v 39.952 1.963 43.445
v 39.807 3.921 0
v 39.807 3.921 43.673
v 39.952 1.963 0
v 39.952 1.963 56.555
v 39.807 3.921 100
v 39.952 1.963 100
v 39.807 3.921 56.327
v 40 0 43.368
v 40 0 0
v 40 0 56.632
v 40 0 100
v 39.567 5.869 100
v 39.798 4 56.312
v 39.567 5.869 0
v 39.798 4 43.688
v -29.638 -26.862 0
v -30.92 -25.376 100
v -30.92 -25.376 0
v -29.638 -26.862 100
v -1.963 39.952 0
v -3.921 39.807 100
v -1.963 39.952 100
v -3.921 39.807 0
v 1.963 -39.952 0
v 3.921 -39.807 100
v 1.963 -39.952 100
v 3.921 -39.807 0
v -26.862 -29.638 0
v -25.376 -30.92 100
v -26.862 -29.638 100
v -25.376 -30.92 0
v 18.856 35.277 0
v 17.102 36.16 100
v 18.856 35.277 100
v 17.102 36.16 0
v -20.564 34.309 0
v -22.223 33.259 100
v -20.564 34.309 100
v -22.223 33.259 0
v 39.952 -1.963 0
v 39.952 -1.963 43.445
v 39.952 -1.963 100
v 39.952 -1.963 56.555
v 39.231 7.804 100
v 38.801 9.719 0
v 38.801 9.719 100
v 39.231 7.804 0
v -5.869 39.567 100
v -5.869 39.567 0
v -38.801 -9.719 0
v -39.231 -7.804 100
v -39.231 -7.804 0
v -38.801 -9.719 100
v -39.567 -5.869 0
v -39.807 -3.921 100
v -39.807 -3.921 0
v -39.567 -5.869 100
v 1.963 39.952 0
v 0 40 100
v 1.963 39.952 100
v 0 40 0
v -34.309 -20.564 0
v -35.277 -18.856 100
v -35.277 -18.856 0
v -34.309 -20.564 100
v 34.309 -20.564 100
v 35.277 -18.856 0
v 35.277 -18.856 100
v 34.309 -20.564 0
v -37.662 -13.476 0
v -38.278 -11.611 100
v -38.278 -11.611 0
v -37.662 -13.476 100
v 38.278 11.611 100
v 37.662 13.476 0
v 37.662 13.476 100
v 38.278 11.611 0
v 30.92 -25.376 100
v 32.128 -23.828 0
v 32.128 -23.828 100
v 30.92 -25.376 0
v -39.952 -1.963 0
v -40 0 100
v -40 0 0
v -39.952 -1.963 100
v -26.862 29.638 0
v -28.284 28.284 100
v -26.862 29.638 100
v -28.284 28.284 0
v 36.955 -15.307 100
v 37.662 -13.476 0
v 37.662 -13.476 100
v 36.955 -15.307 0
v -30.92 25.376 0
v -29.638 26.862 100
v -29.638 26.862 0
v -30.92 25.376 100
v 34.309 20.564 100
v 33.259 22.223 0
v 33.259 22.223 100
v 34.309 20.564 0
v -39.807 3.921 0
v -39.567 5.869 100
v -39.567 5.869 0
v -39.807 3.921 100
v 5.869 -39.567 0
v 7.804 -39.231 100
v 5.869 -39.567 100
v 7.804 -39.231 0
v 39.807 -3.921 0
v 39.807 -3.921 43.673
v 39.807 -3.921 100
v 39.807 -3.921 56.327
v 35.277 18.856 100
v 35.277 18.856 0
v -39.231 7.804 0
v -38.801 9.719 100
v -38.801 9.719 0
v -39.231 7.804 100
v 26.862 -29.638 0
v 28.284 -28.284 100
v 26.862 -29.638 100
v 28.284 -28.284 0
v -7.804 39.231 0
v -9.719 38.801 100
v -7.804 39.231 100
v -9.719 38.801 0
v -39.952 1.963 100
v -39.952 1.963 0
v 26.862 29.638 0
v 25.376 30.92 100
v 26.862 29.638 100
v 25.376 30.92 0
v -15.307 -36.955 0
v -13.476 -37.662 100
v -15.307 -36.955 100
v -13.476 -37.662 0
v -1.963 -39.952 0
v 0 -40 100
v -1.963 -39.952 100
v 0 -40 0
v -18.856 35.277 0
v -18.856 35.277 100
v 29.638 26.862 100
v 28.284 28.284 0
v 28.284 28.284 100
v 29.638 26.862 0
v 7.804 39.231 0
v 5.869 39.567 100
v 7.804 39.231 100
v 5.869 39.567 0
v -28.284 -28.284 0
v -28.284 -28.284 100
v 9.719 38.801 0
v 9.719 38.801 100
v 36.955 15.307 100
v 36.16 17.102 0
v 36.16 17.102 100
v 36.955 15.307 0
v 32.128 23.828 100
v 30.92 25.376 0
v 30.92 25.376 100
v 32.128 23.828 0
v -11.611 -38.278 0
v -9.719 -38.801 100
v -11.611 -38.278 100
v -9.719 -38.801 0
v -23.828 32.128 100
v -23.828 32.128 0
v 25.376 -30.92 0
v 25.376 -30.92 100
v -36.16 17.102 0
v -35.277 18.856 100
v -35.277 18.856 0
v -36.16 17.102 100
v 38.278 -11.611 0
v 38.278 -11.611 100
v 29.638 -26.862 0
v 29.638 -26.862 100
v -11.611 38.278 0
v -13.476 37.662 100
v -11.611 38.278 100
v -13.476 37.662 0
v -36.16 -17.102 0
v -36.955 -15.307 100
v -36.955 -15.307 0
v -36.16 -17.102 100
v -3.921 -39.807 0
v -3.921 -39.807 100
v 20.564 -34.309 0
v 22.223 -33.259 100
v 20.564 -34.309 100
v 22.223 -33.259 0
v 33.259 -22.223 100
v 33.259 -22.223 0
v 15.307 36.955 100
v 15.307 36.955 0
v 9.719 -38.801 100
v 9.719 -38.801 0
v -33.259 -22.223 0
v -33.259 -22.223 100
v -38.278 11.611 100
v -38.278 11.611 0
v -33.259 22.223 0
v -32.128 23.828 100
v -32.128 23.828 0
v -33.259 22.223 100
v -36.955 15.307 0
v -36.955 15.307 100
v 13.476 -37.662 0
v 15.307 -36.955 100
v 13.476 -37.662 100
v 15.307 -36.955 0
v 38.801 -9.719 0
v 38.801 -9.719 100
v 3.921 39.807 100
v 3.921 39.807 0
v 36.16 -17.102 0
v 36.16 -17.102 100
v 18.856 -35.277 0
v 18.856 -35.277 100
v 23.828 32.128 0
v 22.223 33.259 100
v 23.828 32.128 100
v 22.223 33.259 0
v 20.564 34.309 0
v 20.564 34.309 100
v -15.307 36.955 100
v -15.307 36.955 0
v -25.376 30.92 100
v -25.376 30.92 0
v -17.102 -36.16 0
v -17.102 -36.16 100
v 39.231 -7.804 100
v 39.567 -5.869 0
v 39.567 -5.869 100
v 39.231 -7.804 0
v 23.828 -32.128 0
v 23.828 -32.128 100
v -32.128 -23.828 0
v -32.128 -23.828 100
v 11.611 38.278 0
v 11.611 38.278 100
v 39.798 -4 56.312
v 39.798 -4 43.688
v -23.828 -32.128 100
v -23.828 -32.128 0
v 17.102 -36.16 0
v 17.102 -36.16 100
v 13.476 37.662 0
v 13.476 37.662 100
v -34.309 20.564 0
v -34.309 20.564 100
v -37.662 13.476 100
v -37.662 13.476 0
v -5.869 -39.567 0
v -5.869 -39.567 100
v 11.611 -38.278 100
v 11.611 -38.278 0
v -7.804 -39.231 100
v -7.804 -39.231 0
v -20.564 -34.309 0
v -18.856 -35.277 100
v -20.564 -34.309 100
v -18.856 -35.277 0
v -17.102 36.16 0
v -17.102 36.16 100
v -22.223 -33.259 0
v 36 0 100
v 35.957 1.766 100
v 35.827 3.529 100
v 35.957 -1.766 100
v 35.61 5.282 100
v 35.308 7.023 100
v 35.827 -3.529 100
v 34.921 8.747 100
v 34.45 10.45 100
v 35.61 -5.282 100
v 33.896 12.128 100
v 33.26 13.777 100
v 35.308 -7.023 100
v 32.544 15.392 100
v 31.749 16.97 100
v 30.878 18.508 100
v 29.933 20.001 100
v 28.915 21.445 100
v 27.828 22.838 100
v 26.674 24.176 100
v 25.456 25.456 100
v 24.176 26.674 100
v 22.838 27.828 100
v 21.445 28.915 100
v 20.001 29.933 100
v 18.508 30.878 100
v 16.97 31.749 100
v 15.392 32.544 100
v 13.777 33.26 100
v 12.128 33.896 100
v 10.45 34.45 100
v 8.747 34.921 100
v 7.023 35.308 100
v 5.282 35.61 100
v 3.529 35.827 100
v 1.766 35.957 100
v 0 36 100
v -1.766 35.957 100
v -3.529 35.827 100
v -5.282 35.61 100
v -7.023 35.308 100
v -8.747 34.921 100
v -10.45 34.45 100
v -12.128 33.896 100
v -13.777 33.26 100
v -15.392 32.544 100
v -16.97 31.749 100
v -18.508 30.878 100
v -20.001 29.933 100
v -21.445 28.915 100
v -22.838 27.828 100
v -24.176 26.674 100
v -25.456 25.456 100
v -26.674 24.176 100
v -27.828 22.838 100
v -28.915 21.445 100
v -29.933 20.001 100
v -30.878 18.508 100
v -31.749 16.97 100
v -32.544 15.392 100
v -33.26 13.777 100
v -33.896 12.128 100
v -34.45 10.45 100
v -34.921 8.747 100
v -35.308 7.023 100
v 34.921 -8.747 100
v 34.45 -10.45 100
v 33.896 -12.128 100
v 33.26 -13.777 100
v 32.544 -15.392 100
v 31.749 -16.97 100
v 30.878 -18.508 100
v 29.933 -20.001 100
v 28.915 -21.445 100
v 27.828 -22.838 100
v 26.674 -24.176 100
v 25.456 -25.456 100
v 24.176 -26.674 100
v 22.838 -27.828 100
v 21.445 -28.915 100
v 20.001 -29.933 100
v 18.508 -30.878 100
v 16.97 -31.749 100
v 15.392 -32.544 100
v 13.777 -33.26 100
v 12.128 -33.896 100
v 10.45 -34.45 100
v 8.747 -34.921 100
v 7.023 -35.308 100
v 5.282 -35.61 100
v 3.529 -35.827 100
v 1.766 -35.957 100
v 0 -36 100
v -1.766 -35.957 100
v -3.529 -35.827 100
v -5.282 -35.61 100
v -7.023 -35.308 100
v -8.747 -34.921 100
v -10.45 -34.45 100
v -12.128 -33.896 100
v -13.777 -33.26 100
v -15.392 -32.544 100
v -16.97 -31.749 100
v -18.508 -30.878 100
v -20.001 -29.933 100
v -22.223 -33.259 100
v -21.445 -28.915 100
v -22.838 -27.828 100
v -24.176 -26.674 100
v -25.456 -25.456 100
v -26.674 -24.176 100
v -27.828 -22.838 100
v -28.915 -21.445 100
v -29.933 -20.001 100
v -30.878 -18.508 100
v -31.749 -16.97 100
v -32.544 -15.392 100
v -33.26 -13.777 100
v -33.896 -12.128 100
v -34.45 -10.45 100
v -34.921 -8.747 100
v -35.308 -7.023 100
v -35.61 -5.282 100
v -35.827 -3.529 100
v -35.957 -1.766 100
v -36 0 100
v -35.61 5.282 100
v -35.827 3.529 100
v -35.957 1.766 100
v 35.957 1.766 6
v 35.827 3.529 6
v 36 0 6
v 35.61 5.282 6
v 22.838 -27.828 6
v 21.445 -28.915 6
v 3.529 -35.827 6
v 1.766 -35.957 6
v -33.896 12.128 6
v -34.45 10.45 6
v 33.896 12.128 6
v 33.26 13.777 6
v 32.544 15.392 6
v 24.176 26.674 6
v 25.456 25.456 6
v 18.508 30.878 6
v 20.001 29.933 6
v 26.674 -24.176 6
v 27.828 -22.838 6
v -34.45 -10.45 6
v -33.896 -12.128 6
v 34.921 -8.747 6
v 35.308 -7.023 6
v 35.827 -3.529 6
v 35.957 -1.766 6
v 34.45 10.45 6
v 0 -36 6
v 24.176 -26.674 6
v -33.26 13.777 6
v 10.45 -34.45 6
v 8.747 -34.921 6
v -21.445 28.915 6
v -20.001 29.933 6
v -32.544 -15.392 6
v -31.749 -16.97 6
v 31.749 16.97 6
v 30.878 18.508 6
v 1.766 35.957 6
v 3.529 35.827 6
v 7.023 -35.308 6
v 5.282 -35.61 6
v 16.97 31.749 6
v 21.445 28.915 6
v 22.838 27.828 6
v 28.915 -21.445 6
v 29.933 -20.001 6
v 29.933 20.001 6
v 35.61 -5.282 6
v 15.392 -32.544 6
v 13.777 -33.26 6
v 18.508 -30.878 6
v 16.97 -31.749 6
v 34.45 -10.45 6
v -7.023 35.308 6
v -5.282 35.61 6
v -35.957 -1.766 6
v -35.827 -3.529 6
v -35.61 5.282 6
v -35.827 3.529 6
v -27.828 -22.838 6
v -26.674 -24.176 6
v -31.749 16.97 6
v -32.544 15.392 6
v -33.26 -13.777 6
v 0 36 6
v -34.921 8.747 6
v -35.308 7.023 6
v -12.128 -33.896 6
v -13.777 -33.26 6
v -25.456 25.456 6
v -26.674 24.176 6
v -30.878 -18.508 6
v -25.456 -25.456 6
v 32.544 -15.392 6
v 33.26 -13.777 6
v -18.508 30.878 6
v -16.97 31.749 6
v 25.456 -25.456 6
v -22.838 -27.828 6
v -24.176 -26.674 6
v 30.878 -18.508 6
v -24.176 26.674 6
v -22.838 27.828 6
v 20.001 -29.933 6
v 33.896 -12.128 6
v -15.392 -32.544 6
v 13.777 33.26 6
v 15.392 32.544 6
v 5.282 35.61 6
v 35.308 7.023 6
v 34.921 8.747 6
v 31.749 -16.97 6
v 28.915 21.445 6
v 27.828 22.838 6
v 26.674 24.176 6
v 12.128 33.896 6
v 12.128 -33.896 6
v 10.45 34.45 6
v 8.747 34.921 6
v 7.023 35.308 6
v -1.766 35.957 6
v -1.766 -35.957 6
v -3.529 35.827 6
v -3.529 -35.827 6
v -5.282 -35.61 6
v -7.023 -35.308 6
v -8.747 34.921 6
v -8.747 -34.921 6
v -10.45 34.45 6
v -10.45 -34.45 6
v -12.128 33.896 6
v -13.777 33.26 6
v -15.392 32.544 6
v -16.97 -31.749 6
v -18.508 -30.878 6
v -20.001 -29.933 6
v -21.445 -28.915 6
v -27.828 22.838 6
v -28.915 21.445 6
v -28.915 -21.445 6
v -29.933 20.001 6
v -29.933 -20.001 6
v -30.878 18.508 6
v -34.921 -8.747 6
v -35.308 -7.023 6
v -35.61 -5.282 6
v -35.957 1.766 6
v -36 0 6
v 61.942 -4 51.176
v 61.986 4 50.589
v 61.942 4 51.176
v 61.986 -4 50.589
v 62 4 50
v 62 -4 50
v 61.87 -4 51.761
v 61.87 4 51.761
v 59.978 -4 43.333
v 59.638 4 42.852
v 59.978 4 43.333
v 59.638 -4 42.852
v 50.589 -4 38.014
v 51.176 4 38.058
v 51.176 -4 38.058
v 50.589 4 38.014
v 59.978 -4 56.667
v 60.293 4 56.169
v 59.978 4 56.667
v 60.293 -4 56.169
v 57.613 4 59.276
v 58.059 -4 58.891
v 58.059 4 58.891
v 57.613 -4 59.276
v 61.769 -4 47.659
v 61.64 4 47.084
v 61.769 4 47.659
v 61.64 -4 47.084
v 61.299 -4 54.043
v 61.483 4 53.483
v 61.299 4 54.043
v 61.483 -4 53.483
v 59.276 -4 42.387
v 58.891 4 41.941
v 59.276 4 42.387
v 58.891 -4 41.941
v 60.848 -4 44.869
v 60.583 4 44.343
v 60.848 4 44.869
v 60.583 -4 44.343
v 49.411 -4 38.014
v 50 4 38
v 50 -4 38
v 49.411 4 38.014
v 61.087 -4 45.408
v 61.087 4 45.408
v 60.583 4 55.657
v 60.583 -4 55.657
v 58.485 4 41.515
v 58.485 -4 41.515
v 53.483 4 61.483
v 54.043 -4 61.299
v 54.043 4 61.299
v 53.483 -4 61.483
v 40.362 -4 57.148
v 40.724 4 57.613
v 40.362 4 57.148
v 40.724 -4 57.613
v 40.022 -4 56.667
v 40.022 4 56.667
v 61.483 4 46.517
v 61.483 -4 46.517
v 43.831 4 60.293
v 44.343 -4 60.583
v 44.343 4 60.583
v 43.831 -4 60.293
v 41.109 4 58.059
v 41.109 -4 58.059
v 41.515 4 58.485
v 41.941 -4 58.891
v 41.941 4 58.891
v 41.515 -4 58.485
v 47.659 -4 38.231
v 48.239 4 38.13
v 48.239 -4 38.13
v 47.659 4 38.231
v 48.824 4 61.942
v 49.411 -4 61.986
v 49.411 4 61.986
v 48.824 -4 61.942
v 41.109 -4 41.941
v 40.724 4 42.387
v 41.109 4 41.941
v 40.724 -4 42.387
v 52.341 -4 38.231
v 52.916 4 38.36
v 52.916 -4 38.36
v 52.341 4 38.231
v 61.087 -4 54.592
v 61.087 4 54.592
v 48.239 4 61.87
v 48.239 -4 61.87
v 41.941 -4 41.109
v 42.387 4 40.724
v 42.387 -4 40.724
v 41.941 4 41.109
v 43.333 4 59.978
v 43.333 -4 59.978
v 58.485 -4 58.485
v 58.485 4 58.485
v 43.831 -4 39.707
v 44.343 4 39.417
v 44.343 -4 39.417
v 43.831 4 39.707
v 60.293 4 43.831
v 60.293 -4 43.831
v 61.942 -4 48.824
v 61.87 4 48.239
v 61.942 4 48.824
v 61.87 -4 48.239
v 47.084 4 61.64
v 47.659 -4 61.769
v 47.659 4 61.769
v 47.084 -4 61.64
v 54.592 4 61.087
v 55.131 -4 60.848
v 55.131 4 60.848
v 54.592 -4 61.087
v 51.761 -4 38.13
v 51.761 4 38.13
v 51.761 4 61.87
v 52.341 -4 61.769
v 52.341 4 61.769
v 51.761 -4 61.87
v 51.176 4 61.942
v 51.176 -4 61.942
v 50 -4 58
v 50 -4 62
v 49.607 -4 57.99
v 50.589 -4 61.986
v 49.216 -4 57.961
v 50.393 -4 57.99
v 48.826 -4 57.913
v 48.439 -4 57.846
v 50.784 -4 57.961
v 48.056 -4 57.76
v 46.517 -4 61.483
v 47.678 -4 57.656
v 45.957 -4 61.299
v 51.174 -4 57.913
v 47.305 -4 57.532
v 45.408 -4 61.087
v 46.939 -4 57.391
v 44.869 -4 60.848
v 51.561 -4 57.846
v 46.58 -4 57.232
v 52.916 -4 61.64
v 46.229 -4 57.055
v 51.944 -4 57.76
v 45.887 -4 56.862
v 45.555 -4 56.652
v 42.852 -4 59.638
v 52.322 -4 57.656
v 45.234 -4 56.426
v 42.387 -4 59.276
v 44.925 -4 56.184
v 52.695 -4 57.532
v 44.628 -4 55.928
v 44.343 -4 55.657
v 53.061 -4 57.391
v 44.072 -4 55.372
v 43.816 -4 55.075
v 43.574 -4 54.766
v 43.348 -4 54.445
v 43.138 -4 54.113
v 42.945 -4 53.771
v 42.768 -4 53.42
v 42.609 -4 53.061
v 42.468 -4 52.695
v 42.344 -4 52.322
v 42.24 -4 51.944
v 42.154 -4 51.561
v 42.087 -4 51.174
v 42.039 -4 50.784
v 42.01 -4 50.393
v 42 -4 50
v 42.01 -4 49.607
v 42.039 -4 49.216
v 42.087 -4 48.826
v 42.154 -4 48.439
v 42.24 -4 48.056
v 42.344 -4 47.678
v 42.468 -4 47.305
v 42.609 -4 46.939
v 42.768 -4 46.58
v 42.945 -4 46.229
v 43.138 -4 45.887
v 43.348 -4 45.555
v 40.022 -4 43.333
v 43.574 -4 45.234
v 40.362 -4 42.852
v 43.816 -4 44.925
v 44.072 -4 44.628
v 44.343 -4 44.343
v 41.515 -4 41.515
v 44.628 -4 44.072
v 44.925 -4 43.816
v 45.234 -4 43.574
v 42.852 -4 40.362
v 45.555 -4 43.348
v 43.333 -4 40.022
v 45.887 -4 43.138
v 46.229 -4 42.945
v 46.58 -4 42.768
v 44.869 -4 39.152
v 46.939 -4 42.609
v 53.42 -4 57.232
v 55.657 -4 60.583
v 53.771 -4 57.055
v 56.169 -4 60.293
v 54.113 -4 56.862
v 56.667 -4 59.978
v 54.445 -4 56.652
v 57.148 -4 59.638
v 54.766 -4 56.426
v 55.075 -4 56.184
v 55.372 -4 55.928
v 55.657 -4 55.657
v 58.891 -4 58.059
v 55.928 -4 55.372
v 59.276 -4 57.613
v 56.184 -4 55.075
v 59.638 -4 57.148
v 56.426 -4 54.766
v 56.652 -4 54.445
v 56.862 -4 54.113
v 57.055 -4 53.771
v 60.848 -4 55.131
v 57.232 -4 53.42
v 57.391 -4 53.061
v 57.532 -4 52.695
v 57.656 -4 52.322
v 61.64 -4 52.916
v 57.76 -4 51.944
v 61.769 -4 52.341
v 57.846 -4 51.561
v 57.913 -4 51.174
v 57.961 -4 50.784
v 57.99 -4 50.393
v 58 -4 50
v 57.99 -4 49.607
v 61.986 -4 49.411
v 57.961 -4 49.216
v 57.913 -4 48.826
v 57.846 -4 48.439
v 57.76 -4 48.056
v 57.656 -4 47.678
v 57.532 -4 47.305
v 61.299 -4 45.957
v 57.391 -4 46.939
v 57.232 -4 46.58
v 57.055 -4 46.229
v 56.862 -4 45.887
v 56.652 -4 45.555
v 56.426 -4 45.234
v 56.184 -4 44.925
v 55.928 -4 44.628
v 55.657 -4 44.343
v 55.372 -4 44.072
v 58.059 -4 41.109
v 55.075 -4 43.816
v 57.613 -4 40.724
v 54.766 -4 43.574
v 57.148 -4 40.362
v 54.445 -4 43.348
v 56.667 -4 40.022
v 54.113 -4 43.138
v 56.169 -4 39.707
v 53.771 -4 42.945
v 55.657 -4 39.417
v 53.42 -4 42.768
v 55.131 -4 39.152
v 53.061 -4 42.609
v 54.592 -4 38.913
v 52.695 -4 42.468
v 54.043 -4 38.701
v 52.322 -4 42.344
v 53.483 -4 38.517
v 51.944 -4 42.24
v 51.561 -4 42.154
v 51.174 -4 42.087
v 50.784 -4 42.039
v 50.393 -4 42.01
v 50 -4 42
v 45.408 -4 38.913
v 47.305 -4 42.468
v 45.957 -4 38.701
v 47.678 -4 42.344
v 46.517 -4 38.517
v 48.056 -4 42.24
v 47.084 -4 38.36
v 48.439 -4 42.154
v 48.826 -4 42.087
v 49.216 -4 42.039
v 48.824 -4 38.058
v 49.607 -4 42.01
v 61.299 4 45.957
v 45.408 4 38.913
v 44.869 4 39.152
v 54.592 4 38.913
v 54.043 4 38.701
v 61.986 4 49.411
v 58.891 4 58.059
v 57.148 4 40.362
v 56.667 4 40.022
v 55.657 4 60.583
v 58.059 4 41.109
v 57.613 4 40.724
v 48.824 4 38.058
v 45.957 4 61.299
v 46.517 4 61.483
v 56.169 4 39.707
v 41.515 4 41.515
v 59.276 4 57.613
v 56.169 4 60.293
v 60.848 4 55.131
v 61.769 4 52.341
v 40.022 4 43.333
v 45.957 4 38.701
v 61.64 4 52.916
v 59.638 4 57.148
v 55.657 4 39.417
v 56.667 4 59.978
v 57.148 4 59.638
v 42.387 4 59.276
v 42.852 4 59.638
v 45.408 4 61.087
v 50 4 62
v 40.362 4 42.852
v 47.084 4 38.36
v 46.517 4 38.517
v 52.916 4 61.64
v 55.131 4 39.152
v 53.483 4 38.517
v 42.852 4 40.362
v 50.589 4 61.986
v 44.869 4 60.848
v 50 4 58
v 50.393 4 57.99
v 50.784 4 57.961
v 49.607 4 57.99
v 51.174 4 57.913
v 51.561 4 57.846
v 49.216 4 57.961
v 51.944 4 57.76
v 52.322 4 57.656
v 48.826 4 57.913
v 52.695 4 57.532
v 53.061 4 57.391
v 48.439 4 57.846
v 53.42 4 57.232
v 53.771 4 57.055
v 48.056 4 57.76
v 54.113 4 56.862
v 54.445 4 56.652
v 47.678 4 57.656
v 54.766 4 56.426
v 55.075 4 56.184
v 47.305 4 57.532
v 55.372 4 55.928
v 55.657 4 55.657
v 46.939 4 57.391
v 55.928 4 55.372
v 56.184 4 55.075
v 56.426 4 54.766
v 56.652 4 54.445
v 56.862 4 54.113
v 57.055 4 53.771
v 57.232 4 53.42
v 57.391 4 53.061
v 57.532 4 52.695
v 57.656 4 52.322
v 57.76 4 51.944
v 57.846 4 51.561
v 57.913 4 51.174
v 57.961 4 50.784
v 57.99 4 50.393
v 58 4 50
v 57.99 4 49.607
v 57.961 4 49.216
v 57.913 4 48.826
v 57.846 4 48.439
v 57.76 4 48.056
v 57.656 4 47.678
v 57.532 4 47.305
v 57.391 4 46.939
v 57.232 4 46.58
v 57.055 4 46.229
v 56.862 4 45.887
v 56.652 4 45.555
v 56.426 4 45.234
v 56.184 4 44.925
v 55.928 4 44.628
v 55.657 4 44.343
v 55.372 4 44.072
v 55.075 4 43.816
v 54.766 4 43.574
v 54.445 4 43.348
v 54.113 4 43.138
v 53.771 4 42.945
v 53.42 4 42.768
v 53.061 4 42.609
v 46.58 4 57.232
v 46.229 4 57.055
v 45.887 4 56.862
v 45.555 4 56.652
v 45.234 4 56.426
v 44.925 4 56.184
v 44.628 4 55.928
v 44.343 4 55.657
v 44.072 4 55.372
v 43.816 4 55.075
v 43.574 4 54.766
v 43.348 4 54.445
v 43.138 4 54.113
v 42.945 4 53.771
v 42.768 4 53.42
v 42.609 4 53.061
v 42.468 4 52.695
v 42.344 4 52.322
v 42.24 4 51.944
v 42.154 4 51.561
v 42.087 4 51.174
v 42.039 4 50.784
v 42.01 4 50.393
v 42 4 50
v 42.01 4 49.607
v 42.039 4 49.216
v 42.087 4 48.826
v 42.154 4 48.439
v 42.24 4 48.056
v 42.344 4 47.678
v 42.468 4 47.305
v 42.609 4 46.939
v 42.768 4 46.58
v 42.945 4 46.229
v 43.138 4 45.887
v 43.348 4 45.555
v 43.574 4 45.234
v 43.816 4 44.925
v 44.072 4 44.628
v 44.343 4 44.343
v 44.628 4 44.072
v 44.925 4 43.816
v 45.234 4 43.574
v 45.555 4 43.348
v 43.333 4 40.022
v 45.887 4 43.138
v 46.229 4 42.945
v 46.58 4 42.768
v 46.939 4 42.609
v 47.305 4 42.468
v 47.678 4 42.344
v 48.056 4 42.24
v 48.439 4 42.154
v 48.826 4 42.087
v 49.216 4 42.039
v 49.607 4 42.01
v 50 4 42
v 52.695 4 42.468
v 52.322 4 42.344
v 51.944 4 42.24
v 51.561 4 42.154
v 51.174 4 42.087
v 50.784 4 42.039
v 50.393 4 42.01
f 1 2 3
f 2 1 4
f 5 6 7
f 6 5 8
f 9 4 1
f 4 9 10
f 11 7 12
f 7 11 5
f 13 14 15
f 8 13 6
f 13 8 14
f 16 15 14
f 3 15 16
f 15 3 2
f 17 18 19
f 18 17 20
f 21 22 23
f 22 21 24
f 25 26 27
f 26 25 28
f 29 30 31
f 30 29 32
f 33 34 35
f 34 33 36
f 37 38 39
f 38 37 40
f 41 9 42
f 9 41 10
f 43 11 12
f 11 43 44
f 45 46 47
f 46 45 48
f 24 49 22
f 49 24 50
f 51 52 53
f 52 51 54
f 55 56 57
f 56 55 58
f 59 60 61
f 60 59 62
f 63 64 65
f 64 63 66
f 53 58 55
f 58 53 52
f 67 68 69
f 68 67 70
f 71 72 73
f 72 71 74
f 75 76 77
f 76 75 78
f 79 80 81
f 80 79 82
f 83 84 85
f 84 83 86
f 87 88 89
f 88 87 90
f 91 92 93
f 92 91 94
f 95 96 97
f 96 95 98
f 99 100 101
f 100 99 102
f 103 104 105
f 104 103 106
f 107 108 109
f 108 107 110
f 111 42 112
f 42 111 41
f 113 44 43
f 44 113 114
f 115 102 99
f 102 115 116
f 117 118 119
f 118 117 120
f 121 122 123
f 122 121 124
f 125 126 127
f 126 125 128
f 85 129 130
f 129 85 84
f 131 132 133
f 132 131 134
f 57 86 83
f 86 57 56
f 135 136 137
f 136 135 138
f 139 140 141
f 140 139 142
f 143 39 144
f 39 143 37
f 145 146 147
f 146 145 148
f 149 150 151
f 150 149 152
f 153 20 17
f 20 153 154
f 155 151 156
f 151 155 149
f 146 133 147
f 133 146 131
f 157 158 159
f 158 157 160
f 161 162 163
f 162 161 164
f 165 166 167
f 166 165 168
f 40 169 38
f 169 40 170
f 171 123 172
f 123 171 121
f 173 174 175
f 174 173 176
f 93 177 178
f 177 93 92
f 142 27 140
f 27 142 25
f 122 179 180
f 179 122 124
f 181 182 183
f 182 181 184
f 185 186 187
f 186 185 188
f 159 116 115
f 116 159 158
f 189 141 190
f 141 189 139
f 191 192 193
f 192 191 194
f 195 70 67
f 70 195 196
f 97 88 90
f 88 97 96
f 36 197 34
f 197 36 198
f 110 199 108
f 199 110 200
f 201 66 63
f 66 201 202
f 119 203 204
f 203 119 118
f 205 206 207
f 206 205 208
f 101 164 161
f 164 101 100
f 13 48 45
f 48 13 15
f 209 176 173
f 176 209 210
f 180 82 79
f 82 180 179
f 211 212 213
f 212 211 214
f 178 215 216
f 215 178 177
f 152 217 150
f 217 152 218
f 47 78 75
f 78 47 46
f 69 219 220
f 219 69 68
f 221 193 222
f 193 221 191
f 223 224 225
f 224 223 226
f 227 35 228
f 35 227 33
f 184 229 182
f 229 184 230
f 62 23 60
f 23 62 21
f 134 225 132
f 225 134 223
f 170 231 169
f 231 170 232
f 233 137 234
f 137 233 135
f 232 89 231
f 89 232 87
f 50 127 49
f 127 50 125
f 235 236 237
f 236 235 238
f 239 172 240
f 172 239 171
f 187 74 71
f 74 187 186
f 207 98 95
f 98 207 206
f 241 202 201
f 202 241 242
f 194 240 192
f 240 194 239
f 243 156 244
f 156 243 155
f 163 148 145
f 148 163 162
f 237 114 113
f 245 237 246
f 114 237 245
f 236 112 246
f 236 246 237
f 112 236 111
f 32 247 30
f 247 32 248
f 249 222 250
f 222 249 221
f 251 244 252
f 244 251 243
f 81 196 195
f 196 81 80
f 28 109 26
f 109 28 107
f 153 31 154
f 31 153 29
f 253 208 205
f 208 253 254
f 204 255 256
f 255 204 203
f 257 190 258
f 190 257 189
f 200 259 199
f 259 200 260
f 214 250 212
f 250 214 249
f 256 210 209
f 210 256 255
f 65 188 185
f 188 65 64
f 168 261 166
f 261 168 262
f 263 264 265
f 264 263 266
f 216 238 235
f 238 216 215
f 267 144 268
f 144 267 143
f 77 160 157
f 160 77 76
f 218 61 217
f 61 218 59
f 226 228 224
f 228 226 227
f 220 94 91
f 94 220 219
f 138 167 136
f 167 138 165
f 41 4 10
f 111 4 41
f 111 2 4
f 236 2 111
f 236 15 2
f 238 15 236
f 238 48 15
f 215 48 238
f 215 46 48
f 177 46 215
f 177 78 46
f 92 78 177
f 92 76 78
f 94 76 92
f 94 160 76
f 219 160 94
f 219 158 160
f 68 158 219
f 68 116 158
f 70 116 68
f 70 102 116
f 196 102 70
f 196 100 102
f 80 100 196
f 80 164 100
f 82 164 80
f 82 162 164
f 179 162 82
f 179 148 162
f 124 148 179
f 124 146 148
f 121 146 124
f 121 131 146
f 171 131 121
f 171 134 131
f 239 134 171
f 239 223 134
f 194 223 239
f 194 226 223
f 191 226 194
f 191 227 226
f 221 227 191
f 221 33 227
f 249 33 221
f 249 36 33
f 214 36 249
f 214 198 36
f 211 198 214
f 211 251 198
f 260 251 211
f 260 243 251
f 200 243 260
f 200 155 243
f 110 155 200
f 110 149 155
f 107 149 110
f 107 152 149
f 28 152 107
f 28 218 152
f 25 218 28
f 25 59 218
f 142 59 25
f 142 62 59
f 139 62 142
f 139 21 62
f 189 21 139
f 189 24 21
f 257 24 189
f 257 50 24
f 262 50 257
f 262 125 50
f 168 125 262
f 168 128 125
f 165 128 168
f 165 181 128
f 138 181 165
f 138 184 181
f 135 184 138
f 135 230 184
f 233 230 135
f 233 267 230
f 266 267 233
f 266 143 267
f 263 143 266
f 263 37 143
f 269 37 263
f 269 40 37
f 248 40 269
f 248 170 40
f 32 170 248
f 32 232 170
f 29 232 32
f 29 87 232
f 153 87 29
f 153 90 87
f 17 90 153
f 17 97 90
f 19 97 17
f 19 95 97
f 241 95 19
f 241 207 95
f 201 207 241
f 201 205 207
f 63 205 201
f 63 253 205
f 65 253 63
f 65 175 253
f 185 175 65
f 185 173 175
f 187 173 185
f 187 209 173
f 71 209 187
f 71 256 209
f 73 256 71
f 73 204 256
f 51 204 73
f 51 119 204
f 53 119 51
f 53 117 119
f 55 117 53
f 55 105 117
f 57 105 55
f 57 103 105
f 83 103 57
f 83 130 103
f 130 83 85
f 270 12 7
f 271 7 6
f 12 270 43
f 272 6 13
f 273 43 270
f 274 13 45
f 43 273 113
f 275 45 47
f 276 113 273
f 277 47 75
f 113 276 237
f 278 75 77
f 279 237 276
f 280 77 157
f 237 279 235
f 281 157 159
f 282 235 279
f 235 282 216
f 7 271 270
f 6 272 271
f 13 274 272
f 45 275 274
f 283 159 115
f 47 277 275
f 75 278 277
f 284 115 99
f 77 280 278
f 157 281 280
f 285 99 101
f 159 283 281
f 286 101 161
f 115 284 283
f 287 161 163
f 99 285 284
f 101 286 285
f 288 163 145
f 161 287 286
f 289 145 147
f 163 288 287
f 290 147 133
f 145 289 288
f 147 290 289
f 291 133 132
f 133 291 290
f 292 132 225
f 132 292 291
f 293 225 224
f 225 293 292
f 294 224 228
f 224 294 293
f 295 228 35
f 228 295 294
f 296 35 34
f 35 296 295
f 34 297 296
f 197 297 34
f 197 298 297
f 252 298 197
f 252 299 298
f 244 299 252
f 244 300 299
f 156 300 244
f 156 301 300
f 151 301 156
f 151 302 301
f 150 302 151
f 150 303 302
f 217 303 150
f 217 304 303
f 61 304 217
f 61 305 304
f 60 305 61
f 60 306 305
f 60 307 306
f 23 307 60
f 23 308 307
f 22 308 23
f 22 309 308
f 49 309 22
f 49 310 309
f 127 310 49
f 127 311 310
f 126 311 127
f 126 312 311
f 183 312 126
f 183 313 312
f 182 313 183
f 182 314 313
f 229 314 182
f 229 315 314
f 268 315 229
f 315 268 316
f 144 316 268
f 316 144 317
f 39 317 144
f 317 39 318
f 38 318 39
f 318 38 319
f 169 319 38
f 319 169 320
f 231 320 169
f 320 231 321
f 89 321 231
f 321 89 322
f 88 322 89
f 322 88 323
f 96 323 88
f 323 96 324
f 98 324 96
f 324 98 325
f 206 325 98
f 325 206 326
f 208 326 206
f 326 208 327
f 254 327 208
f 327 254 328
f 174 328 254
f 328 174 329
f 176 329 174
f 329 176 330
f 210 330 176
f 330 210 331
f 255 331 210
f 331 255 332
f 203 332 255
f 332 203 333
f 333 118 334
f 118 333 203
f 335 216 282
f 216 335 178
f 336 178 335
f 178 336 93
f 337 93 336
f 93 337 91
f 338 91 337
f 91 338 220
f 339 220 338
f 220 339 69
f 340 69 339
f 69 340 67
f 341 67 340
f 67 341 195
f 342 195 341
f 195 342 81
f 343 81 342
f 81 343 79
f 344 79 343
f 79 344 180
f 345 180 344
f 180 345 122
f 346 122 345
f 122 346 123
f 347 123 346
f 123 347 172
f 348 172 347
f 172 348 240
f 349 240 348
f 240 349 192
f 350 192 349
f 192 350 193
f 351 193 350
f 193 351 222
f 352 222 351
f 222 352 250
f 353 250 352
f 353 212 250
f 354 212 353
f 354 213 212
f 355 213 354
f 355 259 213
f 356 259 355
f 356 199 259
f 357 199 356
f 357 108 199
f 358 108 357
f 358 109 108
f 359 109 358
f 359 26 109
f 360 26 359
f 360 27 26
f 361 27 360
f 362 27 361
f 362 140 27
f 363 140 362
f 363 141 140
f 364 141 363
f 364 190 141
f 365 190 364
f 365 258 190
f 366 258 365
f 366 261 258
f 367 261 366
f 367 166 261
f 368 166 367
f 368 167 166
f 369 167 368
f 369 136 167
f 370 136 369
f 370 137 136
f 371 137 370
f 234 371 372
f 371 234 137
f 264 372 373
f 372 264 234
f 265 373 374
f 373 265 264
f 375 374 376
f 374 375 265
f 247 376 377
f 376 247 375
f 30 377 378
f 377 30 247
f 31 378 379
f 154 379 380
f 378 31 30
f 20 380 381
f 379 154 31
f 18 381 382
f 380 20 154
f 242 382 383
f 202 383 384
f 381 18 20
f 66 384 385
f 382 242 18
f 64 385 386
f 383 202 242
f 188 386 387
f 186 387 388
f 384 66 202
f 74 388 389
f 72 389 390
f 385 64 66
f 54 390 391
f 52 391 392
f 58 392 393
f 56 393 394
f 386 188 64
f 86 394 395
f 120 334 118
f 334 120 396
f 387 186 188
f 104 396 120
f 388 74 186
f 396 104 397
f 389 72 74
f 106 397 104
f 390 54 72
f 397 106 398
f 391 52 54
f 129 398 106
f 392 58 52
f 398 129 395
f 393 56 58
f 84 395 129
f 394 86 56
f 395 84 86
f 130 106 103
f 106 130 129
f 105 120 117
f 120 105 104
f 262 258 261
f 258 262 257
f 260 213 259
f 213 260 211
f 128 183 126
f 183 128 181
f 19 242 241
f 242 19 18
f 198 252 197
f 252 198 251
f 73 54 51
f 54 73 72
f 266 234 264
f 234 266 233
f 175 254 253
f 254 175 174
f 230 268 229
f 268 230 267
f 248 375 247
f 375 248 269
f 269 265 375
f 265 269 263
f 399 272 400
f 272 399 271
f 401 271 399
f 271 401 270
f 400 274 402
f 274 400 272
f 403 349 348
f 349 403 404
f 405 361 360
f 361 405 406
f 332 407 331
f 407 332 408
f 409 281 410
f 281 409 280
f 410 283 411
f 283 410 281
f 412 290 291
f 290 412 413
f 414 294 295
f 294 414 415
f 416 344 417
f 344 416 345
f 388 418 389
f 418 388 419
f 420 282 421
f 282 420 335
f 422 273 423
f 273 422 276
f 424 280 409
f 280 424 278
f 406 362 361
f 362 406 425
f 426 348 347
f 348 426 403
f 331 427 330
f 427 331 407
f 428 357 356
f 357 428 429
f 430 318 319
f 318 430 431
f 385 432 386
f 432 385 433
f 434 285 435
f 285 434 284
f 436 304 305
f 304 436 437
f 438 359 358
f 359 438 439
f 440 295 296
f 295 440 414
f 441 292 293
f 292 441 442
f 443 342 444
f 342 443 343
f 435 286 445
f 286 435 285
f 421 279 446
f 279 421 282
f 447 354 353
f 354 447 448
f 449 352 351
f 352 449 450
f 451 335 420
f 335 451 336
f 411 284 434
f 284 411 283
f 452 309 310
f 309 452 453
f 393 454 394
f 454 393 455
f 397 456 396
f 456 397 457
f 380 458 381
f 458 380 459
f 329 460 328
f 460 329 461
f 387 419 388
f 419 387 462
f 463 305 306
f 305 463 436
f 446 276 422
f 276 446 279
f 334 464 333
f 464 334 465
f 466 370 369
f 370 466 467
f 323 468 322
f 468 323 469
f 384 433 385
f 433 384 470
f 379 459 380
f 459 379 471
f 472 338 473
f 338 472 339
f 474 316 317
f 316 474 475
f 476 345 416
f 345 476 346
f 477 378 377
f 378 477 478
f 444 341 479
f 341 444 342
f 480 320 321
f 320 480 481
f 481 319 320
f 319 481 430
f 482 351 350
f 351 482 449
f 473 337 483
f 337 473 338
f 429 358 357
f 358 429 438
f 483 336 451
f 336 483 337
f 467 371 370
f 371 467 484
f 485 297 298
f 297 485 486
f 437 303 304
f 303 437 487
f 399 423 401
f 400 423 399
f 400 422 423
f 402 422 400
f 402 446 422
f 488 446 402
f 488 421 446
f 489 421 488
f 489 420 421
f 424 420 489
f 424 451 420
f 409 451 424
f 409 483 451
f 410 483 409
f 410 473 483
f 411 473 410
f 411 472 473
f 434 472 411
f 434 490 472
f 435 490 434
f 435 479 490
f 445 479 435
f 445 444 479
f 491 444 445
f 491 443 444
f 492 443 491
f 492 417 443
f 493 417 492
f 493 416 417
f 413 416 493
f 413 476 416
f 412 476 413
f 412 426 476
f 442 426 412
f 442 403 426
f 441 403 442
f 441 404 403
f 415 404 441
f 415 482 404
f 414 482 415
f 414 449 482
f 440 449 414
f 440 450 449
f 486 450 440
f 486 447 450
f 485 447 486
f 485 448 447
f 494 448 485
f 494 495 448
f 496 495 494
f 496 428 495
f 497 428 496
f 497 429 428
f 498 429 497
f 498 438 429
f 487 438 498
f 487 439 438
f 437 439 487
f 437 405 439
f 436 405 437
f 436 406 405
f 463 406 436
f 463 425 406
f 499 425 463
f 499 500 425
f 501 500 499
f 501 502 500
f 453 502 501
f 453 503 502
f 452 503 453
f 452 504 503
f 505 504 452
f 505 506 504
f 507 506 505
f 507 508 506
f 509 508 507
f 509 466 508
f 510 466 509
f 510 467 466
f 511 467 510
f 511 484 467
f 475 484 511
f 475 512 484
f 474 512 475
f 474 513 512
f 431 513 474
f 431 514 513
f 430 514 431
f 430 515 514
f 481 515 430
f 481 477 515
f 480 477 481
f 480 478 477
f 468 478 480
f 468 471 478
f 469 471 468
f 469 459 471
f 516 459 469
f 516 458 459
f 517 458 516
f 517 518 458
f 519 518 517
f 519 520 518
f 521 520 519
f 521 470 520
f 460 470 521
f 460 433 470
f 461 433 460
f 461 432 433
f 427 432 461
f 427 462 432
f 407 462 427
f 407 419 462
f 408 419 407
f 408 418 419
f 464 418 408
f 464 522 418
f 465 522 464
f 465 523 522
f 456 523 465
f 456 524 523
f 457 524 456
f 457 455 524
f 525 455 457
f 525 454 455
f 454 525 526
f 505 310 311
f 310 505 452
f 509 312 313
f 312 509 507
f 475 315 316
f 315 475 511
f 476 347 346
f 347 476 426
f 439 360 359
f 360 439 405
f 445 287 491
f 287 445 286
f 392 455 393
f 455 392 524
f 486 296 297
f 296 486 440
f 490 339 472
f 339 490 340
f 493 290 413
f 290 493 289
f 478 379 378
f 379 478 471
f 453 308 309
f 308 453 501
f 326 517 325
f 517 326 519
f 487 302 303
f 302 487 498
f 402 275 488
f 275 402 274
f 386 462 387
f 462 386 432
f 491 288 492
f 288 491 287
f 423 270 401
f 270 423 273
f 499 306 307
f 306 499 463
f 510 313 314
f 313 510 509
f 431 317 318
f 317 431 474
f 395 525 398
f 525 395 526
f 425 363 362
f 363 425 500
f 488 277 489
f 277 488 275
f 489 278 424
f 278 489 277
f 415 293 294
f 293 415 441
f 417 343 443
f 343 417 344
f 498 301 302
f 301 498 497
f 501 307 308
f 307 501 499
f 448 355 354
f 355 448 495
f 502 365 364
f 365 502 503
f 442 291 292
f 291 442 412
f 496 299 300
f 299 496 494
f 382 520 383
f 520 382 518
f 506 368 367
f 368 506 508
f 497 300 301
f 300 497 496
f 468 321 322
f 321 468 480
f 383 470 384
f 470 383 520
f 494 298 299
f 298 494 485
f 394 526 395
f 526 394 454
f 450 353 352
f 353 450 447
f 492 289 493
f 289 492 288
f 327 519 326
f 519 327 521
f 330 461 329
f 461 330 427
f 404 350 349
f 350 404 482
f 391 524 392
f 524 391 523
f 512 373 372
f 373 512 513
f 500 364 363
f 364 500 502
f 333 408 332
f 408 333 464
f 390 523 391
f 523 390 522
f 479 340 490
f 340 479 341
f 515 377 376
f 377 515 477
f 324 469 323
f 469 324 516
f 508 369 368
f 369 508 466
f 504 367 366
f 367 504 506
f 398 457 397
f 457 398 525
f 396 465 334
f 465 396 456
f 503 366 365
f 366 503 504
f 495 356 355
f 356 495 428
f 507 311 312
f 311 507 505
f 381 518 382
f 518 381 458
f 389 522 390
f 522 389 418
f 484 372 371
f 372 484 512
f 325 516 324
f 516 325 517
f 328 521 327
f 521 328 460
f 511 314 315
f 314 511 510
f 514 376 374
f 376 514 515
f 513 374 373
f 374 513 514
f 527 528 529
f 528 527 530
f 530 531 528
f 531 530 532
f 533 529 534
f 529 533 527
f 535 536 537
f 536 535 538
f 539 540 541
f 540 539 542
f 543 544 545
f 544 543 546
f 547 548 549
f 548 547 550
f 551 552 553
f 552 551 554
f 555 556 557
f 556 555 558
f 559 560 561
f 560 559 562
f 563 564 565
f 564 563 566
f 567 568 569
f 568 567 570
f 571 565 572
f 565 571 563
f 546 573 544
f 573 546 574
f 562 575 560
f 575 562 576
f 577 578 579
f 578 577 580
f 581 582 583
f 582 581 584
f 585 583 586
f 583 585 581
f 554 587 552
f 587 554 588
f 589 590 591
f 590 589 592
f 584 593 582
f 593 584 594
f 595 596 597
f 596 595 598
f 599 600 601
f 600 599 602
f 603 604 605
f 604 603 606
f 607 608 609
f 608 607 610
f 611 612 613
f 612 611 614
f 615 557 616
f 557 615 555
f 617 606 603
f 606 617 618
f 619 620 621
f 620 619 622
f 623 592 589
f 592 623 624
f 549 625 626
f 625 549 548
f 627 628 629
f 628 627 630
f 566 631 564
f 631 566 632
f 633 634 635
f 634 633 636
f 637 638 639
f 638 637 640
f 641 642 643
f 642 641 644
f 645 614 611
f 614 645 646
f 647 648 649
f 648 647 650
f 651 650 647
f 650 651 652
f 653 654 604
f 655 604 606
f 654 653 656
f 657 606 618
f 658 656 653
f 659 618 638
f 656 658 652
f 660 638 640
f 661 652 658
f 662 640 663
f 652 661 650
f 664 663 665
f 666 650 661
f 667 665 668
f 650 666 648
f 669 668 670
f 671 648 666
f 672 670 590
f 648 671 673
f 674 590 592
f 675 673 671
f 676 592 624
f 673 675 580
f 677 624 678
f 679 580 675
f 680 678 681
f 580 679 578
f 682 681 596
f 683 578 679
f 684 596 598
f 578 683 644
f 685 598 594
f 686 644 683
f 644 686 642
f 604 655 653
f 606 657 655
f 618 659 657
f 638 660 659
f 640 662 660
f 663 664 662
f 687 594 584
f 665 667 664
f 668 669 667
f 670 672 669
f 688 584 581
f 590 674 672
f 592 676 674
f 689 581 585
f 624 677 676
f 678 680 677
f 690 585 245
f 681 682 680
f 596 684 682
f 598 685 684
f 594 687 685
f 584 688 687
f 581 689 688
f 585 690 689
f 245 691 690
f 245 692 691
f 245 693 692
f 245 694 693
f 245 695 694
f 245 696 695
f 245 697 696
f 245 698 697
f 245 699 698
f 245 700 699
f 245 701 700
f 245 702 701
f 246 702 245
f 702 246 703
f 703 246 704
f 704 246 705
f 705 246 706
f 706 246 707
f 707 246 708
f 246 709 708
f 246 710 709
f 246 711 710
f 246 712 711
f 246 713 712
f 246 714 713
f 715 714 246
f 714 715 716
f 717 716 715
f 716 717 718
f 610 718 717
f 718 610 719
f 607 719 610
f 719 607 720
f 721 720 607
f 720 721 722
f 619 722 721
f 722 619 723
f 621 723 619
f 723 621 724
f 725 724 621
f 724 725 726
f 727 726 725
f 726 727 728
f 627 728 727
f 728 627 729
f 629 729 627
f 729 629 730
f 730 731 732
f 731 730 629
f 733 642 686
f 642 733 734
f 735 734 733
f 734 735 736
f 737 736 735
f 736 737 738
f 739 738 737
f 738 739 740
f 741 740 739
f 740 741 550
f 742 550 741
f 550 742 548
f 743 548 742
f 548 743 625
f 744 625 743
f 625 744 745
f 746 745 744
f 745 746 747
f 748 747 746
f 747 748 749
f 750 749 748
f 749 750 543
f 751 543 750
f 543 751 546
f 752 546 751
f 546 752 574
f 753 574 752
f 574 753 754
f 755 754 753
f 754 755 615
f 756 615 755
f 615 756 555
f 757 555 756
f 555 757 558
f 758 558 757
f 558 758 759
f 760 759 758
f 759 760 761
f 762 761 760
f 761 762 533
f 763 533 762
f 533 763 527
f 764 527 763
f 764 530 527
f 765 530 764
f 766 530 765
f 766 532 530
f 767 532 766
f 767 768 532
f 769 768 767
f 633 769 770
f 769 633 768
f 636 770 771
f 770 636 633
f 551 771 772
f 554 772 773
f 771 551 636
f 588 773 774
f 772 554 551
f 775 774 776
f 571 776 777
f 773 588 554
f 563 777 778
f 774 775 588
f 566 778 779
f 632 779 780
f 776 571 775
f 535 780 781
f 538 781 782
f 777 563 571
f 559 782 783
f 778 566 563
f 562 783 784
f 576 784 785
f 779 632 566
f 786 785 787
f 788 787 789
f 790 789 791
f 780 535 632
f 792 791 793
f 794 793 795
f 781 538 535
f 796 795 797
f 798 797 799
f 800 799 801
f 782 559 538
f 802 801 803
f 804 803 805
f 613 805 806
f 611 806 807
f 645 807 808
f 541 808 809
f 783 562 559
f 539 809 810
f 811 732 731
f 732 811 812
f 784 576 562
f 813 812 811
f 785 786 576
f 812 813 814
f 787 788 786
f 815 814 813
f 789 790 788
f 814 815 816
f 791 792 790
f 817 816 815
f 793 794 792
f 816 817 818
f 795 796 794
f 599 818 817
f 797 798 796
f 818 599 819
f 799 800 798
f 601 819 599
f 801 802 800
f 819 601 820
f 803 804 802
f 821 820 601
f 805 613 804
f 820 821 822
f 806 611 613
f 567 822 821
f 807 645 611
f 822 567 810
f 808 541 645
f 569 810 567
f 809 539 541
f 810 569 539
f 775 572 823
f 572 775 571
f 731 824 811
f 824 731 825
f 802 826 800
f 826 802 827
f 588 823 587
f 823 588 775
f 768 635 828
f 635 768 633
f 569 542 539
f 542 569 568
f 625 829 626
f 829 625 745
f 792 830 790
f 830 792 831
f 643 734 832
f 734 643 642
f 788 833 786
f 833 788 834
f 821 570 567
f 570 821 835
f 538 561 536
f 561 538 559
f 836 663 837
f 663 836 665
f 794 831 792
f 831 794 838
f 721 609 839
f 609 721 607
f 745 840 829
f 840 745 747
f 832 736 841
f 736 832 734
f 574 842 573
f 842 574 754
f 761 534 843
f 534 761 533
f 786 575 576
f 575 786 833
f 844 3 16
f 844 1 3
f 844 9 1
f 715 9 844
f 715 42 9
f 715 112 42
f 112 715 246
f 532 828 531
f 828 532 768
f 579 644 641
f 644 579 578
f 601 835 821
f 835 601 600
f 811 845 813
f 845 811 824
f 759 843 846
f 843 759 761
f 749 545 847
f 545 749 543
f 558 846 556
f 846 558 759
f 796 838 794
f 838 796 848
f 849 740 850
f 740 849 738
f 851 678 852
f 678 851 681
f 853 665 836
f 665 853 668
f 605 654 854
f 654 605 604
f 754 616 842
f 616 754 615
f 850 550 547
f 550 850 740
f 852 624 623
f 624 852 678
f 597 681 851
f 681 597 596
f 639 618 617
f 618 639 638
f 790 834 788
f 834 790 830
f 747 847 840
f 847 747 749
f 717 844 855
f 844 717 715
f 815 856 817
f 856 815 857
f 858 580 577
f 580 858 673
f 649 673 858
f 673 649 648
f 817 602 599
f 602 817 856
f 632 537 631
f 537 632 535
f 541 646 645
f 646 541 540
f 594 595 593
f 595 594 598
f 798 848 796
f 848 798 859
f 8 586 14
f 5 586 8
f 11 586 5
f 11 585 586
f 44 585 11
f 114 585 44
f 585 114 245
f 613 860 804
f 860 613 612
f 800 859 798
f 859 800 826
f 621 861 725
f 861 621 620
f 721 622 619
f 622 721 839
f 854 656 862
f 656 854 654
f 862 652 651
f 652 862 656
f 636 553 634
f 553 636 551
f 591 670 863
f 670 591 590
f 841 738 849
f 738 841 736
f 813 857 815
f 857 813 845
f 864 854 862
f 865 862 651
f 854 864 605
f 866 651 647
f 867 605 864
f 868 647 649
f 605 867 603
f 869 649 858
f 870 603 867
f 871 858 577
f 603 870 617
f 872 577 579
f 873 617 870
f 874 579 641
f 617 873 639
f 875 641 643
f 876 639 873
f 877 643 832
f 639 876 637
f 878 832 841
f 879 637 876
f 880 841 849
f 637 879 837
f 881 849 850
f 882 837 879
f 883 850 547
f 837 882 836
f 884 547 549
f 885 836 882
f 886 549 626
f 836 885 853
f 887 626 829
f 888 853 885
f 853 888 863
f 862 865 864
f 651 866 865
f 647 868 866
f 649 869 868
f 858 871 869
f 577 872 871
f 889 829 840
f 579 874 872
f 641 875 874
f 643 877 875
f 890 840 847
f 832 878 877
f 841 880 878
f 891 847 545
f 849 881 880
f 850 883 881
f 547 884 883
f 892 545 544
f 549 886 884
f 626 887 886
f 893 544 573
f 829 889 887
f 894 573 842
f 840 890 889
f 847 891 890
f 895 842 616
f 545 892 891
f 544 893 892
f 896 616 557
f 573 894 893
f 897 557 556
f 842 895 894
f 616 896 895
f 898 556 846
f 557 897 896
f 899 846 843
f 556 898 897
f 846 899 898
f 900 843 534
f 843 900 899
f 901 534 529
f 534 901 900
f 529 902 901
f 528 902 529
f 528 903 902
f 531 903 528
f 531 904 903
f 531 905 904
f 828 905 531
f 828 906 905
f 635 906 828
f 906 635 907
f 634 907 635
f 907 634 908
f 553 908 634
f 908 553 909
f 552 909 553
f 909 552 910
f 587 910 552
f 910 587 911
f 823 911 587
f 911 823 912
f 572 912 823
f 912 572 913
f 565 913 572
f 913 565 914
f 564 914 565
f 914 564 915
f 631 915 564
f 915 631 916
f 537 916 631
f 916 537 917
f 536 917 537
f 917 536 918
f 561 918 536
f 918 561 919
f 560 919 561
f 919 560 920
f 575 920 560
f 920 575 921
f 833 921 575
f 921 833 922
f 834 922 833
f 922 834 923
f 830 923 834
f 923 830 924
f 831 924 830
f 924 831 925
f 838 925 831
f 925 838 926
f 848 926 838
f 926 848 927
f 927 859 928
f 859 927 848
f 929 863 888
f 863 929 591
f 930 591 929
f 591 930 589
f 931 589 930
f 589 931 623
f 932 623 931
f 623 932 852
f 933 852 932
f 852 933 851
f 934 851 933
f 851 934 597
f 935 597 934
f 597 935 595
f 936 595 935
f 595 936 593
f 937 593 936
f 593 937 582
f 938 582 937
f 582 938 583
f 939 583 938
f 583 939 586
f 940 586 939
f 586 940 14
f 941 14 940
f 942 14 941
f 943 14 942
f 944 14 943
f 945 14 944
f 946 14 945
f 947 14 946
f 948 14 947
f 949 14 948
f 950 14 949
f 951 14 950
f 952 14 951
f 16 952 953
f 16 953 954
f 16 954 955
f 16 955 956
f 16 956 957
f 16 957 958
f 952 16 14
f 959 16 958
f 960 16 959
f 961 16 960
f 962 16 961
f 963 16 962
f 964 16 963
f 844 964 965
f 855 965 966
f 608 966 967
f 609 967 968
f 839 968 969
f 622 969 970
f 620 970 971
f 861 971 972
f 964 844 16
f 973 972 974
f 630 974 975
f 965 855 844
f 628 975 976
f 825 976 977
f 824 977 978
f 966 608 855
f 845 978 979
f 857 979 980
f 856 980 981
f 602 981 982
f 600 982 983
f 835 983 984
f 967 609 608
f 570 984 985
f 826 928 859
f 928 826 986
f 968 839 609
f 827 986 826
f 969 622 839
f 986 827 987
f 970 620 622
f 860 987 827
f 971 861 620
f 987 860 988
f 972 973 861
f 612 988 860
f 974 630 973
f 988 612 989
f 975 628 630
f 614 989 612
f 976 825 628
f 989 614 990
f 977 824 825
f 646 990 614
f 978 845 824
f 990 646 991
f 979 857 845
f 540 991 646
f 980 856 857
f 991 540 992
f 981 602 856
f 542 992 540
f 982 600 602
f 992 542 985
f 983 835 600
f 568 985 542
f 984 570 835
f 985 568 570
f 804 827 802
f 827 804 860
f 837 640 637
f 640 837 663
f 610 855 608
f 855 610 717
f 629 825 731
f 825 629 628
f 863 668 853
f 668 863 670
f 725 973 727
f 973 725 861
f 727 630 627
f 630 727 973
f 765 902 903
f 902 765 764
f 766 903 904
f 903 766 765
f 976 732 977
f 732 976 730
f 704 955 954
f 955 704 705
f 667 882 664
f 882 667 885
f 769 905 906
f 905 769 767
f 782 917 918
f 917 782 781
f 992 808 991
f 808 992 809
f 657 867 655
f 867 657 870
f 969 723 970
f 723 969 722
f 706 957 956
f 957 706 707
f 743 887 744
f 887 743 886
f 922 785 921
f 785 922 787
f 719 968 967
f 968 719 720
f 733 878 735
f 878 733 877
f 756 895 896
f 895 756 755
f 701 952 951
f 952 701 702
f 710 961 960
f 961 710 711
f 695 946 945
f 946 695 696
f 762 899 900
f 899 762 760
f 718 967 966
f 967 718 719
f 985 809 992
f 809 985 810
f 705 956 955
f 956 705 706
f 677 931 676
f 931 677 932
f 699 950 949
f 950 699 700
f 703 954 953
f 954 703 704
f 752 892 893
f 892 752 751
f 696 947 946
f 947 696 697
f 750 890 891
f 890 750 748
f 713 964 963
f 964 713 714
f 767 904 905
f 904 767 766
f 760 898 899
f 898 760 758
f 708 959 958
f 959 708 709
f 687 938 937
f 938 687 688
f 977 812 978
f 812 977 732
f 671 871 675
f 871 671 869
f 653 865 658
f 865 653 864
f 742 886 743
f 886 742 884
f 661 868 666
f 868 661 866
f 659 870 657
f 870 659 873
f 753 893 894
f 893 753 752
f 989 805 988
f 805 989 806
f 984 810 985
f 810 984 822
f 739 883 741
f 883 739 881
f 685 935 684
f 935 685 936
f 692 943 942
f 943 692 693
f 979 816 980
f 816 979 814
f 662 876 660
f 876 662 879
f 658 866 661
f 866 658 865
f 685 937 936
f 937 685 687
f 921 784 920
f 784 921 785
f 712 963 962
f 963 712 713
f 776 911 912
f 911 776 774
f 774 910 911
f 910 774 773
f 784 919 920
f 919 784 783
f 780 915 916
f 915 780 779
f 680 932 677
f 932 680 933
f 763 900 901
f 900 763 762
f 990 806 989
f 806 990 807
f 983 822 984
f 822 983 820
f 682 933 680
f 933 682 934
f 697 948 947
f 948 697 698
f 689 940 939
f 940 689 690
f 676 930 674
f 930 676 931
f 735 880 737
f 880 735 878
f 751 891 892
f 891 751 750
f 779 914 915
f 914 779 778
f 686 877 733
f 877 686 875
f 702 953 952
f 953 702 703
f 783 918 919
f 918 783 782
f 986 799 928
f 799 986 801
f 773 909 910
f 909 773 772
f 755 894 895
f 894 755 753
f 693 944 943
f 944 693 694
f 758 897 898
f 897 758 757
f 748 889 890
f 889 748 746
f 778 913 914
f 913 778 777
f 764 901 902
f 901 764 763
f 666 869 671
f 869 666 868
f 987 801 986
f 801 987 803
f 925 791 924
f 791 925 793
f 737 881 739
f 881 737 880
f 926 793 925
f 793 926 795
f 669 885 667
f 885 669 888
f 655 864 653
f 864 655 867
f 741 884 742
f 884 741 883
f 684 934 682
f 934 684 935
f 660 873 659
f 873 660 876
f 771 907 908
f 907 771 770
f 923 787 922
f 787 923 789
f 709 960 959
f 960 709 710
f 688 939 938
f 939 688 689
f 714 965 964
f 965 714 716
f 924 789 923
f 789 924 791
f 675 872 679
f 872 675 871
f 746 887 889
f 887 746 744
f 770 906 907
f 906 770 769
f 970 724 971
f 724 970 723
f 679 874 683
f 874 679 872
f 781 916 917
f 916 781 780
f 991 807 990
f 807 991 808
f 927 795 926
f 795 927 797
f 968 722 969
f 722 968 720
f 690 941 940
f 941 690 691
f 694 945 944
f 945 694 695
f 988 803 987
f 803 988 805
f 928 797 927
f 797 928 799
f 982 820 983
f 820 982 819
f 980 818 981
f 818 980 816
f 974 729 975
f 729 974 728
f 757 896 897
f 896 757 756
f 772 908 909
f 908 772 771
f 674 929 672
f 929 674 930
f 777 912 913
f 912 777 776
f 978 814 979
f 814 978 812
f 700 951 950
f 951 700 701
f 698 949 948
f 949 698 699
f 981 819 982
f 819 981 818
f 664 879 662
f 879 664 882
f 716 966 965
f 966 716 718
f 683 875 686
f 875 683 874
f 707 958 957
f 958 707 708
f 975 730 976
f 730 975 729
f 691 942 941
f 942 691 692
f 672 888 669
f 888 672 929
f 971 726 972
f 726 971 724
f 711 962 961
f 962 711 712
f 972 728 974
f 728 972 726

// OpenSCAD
$fn = 128;

outer_diameter = 80;
outer_radius = outer_diameter / 2;
cup_height = 100;
wall_thickness = 4;
bottom_thickness = 6;
inner_radius = outer_radius - wall_thickness;

handle_outer_radius = 12;
handle_thickness = 4;
handle_inner_radius = handle_outer_radius - handle_thickness;
handle_depth = 8;
handle_center_x = outer_radius + handle_outer_radius - 2;
handle_center_z = cup_height / 2;

module cup() {
    difference() {
        cylinder(
            h = cup_height,
            r = outer_radius
        );

        translate([0, 0, bottom_thickness])
            cylinder(
                h = cup_height,
                r = inner_radius
            );
    }
}

module ring_handle() {
    translate([handle_center_x, 0, handle_center_z])
        rotate([90, 0, 0])
            difference() {
                cylinder(
                    h = handle_depth,
                    r = handle_outer_radius,
                    center = true
                );

                cylinder(
                    h = handle_depth + 2,
                    r = handle_inner_radius,
                    center = true
                );
            }
}

union() {
    cup();
    ring_handle();
}
